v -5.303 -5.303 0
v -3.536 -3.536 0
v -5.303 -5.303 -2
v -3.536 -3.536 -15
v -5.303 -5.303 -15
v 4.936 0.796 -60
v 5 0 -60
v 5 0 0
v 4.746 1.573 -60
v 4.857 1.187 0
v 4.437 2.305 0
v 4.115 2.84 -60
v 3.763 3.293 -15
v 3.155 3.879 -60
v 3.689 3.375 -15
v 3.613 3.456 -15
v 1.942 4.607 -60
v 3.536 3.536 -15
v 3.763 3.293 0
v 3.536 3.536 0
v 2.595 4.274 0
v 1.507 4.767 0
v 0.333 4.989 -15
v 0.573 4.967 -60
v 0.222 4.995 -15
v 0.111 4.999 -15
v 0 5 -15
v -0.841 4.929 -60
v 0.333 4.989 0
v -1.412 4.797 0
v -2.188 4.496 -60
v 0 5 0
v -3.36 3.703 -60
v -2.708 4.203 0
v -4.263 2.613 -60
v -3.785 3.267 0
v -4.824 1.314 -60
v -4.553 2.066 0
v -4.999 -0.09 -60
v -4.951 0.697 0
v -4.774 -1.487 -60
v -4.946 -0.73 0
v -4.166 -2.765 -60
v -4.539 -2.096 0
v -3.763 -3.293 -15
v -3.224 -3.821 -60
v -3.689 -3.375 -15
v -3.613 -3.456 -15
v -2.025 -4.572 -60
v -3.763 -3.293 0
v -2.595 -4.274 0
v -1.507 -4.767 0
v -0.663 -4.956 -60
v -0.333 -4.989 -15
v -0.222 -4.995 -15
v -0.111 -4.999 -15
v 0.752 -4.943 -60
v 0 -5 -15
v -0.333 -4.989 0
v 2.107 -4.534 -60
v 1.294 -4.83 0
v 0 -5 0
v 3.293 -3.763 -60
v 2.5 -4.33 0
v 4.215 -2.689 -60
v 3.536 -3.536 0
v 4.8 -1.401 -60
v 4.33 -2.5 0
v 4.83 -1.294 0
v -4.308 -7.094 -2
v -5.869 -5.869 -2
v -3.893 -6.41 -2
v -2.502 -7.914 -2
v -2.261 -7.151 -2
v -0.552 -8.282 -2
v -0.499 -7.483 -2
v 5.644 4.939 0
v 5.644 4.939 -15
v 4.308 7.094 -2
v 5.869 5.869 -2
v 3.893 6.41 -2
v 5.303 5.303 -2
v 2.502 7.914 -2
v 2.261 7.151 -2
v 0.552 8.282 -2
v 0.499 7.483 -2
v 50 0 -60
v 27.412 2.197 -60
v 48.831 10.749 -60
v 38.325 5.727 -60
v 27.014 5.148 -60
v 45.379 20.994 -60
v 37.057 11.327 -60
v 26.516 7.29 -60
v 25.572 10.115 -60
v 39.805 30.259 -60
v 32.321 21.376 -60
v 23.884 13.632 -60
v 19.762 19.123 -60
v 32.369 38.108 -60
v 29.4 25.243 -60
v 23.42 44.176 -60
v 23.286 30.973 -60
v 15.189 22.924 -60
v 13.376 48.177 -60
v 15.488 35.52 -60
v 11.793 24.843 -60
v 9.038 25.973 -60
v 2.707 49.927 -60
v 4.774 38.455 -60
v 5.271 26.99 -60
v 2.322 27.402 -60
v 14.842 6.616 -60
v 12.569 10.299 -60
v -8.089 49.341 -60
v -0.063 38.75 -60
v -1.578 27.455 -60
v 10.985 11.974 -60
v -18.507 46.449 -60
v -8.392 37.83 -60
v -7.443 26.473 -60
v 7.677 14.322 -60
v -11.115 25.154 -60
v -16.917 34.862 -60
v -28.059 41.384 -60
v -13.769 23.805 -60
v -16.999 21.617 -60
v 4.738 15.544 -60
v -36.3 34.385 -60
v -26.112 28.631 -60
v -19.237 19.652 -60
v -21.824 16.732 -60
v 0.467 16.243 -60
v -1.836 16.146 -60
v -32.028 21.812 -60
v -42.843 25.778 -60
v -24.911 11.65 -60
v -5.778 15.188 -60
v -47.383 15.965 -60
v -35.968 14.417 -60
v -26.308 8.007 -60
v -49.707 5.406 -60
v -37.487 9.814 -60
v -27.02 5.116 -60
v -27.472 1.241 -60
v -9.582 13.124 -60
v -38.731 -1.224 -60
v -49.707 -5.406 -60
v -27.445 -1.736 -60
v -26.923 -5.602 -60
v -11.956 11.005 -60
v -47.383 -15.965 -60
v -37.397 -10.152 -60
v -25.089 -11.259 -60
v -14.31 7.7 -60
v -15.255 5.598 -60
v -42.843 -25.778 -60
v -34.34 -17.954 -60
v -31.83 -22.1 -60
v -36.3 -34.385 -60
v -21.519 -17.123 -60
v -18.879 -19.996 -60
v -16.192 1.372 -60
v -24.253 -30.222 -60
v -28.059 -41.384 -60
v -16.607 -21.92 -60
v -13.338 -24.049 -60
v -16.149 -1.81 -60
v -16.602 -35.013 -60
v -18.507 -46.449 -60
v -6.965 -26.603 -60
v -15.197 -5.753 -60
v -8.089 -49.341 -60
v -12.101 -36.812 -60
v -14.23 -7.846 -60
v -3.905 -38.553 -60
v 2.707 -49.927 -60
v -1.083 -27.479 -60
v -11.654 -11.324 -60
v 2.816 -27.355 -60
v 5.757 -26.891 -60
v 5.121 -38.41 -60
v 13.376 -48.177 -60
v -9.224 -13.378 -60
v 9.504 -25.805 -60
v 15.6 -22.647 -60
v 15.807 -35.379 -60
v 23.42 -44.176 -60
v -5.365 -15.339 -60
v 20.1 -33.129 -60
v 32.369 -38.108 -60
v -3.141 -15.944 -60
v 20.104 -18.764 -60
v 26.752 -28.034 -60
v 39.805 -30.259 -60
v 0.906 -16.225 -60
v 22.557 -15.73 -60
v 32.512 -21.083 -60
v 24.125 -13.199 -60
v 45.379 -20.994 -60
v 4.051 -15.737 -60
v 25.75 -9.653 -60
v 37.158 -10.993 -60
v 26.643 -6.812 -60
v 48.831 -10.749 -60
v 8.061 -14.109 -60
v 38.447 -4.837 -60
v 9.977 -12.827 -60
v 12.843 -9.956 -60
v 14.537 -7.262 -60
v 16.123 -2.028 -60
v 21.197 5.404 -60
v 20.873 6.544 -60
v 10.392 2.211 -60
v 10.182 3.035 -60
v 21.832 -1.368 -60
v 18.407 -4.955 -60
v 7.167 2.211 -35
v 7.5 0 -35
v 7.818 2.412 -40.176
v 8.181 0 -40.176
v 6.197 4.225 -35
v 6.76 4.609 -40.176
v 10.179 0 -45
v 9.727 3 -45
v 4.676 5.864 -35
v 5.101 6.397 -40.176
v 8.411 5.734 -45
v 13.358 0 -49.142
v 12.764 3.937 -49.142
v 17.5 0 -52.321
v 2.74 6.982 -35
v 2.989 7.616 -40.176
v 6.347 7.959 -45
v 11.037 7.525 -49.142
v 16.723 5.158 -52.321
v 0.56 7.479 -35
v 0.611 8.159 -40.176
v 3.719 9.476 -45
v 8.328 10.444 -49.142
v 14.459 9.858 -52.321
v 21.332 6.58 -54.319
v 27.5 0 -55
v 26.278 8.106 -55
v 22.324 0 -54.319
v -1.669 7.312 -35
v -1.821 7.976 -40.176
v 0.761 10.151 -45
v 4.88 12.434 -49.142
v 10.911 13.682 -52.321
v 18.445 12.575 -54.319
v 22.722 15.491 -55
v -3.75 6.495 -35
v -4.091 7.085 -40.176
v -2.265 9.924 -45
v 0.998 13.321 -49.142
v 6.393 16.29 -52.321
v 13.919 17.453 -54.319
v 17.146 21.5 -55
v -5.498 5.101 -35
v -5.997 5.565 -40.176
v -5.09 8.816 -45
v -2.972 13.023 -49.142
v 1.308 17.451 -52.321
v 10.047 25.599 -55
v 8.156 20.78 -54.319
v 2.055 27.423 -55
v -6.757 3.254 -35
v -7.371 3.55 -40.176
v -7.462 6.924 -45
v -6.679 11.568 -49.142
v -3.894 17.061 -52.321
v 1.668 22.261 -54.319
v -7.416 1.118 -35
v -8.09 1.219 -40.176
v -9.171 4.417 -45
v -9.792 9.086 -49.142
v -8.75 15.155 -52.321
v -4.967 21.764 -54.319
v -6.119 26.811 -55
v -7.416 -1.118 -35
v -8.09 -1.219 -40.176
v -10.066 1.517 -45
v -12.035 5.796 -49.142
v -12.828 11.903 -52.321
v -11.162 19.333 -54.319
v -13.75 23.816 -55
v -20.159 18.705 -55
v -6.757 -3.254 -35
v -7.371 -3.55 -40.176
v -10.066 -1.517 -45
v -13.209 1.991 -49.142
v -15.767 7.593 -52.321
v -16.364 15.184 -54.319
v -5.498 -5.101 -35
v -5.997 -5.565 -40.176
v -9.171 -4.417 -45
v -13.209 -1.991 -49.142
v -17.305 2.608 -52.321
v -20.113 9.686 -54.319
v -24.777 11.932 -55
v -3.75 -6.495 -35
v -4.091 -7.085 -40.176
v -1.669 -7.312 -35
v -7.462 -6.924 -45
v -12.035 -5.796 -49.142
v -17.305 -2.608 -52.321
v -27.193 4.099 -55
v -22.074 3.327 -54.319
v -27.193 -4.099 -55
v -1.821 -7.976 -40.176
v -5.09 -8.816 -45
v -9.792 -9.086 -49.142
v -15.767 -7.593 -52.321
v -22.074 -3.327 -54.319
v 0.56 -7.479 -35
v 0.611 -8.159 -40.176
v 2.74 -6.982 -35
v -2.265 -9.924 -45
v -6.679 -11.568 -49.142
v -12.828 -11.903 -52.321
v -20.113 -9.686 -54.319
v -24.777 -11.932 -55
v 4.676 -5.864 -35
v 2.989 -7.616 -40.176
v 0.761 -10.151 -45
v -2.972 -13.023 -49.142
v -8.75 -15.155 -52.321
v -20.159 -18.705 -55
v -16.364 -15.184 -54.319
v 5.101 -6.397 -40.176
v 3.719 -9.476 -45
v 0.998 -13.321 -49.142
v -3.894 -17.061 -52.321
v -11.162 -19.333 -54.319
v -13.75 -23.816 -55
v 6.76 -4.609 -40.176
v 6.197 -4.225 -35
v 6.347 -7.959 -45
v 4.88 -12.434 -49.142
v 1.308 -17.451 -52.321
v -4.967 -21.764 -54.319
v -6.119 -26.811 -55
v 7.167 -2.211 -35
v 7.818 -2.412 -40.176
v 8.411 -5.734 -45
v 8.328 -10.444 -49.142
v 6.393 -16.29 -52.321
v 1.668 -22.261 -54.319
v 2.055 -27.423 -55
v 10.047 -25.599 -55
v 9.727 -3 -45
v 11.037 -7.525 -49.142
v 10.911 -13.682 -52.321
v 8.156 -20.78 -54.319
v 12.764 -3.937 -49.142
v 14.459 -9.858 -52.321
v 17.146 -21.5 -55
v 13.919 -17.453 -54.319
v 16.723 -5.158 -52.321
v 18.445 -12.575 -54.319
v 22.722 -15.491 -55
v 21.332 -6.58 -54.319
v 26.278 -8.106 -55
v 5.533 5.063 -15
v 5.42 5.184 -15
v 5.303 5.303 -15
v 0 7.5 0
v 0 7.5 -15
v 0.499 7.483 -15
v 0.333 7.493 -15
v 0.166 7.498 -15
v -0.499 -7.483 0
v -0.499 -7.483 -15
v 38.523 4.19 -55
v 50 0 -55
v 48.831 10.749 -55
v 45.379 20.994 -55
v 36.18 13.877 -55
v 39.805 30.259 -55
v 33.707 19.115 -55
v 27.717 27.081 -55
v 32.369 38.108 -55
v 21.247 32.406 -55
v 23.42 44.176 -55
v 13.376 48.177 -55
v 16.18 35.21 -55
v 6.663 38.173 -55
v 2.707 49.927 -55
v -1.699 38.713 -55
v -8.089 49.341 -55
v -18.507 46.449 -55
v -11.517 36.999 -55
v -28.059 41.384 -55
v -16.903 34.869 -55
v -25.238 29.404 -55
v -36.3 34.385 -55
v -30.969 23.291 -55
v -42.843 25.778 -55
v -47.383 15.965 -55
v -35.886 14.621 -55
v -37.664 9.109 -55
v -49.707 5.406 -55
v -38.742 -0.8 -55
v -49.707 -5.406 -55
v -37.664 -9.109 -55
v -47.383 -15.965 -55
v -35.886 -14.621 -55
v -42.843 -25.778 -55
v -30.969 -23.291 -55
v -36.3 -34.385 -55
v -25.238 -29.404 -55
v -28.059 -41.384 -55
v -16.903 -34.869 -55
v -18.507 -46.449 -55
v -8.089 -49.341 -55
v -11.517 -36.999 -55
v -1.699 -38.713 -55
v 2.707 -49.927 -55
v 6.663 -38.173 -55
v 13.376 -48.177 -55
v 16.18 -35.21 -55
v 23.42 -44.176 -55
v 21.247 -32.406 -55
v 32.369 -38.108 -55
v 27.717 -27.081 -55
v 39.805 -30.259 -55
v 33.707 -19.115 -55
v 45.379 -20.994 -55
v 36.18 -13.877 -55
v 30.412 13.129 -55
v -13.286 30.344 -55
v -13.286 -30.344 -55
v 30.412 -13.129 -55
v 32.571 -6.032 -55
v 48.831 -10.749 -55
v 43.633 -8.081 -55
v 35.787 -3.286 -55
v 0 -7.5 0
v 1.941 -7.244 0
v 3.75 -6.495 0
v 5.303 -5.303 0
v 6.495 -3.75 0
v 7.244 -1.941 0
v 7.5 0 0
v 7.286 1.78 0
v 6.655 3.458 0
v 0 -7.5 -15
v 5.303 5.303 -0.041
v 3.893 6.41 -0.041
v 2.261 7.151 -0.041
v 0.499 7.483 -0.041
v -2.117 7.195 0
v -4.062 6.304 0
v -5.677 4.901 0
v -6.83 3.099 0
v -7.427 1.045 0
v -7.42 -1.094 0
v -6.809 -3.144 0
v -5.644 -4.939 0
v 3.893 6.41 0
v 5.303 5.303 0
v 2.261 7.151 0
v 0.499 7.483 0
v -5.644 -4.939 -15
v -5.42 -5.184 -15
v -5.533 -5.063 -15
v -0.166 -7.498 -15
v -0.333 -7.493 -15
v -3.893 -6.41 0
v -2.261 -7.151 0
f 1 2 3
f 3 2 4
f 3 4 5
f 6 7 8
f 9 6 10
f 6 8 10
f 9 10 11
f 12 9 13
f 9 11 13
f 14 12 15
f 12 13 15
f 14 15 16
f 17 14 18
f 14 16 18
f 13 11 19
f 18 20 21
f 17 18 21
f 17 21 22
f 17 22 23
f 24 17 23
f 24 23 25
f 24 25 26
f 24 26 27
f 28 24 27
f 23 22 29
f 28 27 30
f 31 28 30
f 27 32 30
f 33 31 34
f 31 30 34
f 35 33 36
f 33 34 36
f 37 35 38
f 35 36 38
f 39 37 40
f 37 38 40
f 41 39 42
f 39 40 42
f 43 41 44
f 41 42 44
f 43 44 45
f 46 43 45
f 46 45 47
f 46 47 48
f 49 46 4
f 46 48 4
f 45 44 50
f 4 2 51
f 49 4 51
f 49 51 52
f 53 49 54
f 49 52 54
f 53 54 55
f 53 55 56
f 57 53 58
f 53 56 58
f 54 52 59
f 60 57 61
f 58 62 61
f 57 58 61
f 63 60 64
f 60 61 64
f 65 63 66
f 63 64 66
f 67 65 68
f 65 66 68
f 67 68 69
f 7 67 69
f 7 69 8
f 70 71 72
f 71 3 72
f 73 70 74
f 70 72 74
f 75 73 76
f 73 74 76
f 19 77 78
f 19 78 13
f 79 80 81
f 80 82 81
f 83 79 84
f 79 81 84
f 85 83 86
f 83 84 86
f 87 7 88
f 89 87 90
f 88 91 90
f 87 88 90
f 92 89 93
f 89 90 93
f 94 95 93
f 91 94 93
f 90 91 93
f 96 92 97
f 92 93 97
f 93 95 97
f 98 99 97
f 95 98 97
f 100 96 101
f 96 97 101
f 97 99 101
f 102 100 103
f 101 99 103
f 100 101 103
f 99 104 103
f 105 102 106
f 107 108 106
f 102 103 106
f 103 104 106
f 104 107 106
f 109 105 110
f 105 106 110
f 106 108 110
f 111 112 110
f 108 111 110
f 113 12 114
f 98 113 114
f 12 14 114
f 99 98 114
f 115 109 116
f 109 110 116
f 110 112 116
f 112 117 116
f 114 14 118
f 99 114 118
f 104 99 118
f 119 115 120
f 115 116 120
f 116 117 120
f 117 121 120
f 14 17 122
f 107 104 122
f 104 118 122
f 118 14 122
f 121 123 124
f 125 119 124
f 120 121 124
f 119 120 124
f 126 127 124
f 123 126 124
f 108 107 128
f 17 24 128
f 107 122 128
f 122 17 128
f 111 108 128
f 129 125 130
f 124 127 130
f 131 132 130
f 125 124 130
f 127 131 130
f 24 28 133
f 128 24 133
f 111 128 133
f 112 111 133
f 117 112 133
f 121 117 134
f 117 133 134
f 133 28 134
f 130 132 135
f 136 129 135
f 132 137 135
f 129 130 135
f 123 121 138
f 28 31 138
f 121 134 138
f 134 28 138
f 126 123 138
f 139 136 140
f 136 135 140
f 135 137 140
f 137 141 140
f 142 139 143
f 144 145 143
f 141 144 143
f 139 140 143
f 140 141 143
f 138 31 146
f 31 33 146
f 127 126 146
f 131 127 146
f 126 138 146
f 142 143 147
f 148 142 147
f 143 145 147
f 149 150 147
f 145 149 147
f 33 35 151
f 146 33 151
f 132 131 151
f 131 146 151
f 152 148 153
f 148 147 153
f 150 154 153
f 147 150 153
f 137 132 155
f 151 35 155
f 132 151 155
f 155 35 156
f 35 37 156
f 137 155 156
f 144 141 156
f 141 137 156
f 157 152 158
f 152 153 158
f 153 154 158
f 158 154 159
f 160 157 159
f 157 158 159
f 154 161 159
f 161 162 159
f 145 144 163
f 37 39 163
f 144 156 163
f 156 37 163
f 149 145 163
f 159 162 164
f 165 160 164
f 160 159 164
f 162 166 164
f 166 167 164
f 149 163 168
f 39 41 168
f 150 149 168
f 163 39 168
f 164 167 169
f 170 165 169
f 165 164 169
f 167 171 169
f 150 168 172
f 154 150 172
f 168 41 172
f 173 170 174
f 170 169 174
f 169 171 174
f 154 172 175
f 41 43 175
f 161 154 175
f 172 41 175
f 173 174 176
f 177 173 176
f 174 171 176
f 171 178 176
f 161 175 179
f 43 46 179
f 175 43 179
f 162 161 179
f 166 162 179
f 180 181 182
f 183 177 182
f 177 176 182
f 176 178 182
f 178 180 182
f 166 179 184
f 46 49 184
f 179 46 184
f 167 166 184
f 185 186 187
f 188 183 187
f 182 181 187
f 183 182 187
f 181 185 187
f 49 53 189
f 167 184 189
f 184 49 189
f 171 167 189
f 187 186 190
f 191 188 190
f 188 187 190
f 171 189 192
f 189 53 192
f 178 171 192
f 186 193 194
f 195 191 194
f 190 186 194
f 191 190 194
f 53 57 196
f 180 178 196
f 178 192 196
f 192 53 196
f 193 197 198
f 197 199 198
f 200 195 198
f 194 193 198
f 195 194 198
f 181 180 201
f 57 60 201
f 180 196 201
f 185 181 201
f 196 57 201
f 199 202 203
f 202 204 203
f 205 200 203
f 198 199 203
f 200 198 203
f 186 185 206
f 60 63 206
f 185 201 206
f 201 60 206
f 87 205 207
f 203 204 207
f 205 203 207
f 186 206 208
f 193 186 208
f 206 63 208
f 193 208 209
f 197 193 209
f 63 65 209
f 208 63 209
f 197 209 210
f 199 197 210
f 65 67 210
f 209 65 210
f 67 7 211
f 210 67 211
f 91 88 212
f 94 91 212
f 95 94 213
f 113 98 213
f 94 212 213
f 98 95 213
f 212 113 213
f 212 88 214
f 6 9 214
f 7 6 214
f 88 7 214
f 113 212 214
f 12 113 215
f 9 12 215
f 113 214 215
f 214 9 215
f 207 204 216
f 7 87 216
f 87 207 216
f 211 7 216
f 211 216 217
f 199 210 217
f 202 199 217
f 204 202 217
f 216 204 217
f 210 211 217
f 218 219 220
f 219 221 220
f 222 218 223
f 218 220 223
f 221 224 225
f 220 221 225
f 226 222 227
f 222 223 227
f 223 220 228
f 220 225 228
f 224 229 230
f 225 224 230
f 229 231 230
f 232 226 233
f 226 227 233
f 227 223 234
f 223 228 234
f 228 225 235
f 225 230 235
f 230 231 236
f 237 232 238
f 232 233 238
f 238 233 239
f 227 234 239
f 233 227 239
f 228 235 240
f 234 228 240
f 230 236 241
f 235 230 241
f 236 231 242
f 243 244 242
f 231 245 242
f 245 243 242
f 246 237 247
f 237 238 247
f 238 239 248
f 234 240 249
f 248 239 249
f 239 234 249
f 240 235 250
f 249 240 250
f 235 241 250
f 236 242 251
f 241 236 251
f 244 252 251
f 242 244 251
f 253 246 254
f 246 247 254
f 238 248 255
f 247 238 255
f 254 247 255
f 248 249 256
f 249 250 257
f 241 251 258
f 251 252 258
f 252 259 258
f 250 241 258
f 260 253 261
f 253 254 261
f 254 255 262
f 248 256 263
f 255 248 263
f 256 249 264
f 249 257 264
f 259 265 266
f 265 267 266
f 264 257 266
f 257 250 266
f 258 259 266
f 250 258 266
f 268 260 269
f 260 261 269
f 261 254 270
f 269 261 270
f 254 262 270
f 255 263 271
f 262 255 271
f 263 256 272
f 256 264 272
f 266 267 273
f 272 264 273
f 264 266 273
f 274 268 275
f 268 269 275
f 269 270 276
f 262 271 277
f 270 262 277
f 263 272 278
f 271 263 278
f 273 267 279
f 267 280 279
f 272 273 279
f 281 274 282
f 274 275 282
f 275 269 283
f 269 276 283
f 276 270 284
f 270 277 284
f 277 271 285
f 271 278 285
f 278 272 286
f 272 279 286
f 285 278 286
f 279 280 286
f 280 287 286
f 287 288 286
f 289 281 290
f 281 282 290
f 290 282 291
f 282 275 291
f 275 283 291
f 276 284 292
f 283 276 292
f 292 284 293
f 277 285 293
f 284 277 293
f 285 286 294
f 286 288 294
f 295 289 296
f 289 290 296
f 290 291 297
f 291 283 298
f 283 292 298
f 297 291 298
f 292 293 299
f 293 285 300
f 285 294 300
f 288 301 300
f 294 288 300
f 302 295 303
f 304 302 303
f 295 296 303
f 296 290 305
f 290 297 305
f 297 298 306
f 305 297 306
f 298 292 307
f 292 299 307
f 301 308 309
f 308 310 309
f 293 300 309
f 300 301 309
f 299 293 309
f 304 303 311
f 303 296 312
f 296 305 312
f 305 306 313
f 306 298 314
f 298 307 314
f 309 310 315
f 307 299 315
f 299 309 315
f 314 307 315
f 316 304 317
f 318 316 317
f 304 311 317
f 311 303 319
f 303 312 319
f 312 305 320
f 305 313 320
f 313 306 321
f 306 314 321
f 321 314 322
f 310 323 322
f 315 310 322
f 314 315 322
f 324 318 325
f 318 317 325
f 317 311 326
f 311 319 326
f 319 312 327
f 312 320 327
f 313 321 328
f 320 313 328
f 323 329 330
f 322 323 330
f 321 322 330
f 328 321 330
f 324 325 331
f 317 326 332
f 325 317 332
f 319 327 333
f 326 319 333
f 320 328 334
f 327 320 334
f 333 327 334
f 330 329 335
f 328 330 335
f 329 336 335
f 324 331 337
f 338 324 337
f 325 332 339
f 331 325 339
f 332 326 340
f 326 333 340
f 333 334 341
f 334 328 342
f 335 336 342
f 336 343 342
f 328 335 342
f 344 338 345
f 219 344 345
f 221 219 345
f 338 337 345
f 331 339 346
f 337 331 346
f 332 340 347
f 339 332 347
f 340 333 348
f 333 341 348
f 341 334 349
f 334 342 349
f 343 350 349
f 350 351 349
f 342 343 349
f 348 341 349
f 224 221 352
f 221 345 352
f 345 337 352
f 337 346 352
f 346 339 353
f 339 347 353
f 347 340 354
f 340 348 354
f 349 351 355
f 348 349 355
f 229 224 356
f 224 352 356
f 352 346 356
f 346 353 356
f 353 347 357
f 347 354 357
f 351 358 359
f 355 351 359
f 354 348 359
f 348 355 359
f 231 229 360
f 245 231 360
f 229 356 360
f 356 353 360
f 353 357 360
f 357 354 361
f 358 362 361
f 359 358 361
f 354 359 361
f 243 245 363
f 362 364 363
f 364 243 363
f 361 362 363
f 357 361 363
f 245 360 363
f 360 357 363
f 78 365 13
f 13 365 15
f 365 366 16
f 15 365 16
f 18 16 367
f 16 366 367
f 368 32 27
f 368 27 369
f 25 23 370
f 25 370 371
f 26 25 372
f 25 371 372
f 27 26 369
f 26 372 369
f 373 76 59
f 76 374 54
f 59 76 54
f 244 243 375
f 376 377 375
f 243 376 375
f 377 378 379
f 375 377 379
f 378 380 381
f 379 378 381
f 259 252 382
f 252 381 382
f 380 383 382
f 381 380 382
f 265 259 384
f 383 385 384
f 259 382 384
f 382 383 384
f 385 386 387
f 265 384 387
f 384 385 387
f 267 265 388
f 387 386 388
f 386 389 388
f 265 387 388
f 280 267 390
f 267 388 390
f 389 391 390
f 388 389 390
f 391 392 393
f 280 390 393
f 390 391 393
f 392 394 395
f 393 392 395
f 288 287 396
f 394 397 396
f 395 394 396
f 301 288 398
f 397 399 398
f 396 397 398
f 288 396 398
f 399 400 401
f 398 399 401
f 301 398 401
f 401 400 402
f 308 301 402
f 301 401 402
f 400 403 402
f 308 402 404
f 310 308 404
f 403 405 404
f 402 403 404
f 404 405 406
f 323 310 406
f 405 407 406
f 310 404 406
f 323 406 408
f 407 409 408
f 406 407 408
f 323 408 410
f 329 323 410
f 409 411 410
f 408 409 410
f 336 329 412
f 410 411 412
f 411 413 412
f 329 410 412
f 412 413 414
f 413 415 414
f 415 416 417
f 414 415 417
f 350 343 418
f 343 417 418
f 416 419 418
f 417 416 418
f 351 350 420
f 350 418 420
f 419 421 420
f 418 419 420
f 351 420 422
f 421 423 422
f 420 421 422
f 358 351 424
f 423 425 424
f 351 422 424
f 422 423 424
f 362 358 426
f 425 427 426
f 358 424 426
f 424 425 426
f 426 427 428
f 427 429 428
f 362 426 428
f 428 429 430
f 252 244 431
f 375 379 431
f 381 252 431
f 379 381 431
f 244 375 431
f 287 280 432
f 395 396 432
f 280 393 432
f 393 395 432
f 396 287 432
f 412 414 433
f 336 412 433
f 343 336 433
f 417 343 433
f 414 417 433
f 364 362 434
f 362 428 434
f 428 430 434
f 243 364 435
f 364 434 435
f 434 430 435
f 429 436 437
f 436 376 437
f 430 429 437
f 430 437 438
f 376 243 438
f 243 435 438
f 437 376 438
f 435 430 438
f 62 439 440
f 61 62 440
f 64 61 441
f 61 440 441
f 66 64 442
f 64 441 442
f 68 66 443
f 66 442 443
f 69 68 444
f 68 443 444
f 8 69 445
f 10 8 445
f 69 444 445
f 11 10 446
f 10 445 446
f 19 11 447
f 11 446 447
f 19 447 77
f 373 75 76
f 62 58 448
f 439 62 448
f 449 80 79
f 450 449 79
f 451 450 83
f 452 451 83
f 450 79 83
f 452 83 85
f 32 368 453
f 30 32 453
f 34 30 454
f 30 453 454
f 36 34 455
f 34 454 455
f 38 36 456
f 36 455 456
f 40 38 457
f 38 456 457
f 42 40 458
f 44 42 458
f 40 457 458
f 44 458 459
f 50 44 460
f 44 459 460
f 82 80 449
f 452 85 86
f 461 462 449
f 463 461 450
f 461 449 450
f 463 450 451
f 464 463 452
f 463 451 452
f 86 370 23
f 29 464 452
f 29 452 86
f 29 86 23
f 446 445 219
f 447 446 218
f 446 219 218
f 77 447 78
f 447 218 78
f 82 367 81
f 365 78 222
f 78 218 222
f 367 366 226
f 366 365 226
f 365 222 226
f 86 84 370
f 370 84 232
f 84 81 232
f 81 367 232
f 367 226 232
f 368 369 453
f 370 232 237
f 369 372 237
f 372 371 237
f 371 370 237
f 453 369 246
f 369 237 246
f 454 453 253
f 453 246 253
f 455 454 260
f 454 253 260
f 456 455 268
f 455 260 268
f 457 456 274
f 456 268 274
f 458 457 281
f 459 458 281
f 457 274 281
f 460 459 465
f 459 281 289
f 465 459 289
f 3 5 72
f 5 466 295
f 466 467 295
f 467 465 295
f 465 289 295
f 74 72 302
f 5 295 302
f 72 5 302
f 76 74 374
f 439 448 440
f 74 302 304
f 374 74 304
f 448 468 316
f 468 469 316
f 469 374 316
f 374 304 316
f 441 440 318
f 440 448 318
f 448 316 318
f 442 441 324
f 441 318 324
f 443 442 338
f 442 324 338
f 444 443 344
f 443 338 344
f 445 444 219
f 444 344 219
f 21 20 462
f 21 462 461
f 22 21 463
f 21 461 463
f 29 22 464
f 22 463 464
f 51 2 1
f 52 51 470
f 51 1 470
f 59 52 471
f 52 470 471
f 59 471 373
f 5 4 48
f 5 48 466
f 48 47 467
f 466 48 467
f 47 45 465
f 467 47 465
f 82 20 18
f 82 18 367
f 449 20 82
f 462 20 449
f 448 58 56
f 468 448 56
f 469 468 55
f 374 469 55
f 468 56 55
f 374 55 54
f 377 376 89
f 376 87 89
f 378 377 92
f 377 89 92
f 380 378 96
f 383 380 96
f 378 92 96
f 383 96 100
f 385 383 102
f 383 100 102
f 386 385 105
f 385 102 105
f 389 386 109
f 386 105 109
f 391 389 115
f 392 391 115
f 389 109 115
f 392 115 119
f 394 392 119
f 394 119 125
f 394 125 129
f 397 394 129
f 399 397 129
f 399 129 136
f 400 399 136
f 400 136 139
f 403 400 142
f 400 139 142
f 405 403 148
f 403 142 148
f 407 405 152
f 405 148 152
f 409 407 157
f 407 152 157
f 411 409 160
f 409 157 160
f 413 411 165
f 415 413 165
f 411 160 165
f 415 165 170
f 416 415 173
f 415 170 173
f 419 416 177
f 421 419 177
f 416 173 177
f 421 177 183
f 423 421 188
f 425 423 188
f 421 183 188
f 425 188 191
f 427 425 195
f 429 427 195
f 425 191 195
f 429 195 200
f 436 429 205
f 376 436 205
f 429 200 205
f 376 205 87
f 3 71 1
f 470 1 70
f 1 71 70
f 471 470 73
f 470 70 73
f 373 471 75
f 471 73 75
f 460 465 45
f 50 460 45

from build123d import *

# Parameters (mm, degrees)
SKETCH_3_R          = 5
CUT_EXTRUDE_1_DEPTH = 93.736184955
CUT_EXTRUDE_2_DEPTH = 15
CUT_EXTRUDE_3_DEPTH = 15
CUT_EXTRUDE_START   = -15
CUT_EXTRUDE_4_DEPTH = 15
CUT_EXTRUDE_5_DEPTH = 15


with BuildPart() as part:
    # 扫描1: sweep along a path in 草图2
    with BuildLine(Plane.XY) as sweep_1_path:
        CenterArc((0, 0), 50, 0, 360)
    # 草图1 → 扫描1 (sweep)
    with BuildSketch(Plane(origin=(0, 0, 0), x_dir=(1, 0, 0), z_dir=(0, 1, 0))):
        with BuildLine():
            Line((0, 0), (7.5, 0))
            Line((7.5, 0), (7.5, 35))
            ThreePointArc((7.5, 35), (13.357864376, 49.142135624), (27.5, 55))
            Line((27.5, 55), (50, 55))
            Line((50, 55), (50, 60))
            Line((50, 60), (0, 60))
            Line((0, 60), (0, 0))
        make_face()
    sweep(path=sweep_1_path.line)

    # 草图3 → 切除-拉伸1 (cut, through all)
    with BuildSketch(Plane.XY):
        Circle(SKETCH_3_R)
    extrude(amount=-CUT_EXTRUDE_1_DEPTH, mode=Mode.SUBTRACT)

    # 草图5 → 切除-拉伸2 (cut)
    with BuildSketch(Plane.XY):
        Polygon((0, 7.5), (0.5, 7.5), (0, 0), align=None)
    extrude(amount=-CUT_EXTRUDE_2_DEPTH, mode=Mode.SUBTRACT)

    # 草图6 → 切除-拉伸3 (cut)
    with BuildSketch(Plane.XY):
        Polygon((0, 0), (5.303300859, 5.303300859), (5.656854249, 4.949747468), align=None)
    extrude(amount=-CUT_EXTRUDE_3_DEPTH, mode=Mode.SUBTRACT)

    # 草图8 → 切除-拉伸4 (cut)
    with BuildSketch(Plane.XY.offset(CUT_EXTRUDE_START)):
        with BuildLine():
            Line((0, 0), (0, -7.5))
            ThreePointArc((0, -7.5), (-0.249584525, -7.495846021), (-0.498892579, -7.483388684))
            Line((-0.498892579, -7.483388684), (0, 0))
        make_face()
    extrude(amount=CUT_EXTRUDE_4_DEPTH, mode=Mode.SUBTRACT)

    # 草图9 → 切除-拉伸5 (cut)
    with BuildSketch(Plane.XY.offset(CUT_EXTRUDE_START)):
        with BuildLine():
            Line((0, 0), (-5.303300859, -5.303300859))
            ThreePointArc((-5.303300859, -5.303300859), (-5.476846462, -5.123880642), (-5.64432521, -4.938784559))
            Line((-5.64432521, -4.938784559), (0, 0))
        make_face()
    extrude(amount=CUT_EXTRUDE_5_DEPTH, mode=Mode.SUBTRACT)

    # 扫描2: sweep along a curve in space
    with BuildLine() as sweep_2_path:
        ThreePointArc((5.303300859, 5.303300859, 0), (3.099122118, 6.829746854, 0), (0.498892579, 7.483388684, 0))
    # 草图10 → 扫描2 (sweep)
    with BuildSketch(Plane(origin=(0, 0, 0), x_dir=(0, 0, 1), z_dir=(-0.997785157856609, 0.06651901052377394, 0))):
        Polygon((0, 7.483388684), (-1.999931015, 7.5), (-1.999931015, 8.3), align=None)
    sweep(path=sweep_2_path.line)

    # 扫描3: sweep along a curve in space
    with BuildLine() as sweep_3_path:
        ThreePointArc((-5.303300859, -5.303300859, 0), (-3.099122118, -6.829746854, 0), (-0.498892579, -7.483388684, 0))
    # 草图11 → 扫描3 (sweep)
    with BuildSketch(Plane(origin=(0, 0, 0), x_dir=(0, 0, -1), z_dir=(0.997785157856609, -0.06651901052377394, 0))):
        Polygon((0, -7.5), (2, -7.5), (2, -8.3), align=None)
    sweep(path=sweep_3_path.line)


solid = part.part
